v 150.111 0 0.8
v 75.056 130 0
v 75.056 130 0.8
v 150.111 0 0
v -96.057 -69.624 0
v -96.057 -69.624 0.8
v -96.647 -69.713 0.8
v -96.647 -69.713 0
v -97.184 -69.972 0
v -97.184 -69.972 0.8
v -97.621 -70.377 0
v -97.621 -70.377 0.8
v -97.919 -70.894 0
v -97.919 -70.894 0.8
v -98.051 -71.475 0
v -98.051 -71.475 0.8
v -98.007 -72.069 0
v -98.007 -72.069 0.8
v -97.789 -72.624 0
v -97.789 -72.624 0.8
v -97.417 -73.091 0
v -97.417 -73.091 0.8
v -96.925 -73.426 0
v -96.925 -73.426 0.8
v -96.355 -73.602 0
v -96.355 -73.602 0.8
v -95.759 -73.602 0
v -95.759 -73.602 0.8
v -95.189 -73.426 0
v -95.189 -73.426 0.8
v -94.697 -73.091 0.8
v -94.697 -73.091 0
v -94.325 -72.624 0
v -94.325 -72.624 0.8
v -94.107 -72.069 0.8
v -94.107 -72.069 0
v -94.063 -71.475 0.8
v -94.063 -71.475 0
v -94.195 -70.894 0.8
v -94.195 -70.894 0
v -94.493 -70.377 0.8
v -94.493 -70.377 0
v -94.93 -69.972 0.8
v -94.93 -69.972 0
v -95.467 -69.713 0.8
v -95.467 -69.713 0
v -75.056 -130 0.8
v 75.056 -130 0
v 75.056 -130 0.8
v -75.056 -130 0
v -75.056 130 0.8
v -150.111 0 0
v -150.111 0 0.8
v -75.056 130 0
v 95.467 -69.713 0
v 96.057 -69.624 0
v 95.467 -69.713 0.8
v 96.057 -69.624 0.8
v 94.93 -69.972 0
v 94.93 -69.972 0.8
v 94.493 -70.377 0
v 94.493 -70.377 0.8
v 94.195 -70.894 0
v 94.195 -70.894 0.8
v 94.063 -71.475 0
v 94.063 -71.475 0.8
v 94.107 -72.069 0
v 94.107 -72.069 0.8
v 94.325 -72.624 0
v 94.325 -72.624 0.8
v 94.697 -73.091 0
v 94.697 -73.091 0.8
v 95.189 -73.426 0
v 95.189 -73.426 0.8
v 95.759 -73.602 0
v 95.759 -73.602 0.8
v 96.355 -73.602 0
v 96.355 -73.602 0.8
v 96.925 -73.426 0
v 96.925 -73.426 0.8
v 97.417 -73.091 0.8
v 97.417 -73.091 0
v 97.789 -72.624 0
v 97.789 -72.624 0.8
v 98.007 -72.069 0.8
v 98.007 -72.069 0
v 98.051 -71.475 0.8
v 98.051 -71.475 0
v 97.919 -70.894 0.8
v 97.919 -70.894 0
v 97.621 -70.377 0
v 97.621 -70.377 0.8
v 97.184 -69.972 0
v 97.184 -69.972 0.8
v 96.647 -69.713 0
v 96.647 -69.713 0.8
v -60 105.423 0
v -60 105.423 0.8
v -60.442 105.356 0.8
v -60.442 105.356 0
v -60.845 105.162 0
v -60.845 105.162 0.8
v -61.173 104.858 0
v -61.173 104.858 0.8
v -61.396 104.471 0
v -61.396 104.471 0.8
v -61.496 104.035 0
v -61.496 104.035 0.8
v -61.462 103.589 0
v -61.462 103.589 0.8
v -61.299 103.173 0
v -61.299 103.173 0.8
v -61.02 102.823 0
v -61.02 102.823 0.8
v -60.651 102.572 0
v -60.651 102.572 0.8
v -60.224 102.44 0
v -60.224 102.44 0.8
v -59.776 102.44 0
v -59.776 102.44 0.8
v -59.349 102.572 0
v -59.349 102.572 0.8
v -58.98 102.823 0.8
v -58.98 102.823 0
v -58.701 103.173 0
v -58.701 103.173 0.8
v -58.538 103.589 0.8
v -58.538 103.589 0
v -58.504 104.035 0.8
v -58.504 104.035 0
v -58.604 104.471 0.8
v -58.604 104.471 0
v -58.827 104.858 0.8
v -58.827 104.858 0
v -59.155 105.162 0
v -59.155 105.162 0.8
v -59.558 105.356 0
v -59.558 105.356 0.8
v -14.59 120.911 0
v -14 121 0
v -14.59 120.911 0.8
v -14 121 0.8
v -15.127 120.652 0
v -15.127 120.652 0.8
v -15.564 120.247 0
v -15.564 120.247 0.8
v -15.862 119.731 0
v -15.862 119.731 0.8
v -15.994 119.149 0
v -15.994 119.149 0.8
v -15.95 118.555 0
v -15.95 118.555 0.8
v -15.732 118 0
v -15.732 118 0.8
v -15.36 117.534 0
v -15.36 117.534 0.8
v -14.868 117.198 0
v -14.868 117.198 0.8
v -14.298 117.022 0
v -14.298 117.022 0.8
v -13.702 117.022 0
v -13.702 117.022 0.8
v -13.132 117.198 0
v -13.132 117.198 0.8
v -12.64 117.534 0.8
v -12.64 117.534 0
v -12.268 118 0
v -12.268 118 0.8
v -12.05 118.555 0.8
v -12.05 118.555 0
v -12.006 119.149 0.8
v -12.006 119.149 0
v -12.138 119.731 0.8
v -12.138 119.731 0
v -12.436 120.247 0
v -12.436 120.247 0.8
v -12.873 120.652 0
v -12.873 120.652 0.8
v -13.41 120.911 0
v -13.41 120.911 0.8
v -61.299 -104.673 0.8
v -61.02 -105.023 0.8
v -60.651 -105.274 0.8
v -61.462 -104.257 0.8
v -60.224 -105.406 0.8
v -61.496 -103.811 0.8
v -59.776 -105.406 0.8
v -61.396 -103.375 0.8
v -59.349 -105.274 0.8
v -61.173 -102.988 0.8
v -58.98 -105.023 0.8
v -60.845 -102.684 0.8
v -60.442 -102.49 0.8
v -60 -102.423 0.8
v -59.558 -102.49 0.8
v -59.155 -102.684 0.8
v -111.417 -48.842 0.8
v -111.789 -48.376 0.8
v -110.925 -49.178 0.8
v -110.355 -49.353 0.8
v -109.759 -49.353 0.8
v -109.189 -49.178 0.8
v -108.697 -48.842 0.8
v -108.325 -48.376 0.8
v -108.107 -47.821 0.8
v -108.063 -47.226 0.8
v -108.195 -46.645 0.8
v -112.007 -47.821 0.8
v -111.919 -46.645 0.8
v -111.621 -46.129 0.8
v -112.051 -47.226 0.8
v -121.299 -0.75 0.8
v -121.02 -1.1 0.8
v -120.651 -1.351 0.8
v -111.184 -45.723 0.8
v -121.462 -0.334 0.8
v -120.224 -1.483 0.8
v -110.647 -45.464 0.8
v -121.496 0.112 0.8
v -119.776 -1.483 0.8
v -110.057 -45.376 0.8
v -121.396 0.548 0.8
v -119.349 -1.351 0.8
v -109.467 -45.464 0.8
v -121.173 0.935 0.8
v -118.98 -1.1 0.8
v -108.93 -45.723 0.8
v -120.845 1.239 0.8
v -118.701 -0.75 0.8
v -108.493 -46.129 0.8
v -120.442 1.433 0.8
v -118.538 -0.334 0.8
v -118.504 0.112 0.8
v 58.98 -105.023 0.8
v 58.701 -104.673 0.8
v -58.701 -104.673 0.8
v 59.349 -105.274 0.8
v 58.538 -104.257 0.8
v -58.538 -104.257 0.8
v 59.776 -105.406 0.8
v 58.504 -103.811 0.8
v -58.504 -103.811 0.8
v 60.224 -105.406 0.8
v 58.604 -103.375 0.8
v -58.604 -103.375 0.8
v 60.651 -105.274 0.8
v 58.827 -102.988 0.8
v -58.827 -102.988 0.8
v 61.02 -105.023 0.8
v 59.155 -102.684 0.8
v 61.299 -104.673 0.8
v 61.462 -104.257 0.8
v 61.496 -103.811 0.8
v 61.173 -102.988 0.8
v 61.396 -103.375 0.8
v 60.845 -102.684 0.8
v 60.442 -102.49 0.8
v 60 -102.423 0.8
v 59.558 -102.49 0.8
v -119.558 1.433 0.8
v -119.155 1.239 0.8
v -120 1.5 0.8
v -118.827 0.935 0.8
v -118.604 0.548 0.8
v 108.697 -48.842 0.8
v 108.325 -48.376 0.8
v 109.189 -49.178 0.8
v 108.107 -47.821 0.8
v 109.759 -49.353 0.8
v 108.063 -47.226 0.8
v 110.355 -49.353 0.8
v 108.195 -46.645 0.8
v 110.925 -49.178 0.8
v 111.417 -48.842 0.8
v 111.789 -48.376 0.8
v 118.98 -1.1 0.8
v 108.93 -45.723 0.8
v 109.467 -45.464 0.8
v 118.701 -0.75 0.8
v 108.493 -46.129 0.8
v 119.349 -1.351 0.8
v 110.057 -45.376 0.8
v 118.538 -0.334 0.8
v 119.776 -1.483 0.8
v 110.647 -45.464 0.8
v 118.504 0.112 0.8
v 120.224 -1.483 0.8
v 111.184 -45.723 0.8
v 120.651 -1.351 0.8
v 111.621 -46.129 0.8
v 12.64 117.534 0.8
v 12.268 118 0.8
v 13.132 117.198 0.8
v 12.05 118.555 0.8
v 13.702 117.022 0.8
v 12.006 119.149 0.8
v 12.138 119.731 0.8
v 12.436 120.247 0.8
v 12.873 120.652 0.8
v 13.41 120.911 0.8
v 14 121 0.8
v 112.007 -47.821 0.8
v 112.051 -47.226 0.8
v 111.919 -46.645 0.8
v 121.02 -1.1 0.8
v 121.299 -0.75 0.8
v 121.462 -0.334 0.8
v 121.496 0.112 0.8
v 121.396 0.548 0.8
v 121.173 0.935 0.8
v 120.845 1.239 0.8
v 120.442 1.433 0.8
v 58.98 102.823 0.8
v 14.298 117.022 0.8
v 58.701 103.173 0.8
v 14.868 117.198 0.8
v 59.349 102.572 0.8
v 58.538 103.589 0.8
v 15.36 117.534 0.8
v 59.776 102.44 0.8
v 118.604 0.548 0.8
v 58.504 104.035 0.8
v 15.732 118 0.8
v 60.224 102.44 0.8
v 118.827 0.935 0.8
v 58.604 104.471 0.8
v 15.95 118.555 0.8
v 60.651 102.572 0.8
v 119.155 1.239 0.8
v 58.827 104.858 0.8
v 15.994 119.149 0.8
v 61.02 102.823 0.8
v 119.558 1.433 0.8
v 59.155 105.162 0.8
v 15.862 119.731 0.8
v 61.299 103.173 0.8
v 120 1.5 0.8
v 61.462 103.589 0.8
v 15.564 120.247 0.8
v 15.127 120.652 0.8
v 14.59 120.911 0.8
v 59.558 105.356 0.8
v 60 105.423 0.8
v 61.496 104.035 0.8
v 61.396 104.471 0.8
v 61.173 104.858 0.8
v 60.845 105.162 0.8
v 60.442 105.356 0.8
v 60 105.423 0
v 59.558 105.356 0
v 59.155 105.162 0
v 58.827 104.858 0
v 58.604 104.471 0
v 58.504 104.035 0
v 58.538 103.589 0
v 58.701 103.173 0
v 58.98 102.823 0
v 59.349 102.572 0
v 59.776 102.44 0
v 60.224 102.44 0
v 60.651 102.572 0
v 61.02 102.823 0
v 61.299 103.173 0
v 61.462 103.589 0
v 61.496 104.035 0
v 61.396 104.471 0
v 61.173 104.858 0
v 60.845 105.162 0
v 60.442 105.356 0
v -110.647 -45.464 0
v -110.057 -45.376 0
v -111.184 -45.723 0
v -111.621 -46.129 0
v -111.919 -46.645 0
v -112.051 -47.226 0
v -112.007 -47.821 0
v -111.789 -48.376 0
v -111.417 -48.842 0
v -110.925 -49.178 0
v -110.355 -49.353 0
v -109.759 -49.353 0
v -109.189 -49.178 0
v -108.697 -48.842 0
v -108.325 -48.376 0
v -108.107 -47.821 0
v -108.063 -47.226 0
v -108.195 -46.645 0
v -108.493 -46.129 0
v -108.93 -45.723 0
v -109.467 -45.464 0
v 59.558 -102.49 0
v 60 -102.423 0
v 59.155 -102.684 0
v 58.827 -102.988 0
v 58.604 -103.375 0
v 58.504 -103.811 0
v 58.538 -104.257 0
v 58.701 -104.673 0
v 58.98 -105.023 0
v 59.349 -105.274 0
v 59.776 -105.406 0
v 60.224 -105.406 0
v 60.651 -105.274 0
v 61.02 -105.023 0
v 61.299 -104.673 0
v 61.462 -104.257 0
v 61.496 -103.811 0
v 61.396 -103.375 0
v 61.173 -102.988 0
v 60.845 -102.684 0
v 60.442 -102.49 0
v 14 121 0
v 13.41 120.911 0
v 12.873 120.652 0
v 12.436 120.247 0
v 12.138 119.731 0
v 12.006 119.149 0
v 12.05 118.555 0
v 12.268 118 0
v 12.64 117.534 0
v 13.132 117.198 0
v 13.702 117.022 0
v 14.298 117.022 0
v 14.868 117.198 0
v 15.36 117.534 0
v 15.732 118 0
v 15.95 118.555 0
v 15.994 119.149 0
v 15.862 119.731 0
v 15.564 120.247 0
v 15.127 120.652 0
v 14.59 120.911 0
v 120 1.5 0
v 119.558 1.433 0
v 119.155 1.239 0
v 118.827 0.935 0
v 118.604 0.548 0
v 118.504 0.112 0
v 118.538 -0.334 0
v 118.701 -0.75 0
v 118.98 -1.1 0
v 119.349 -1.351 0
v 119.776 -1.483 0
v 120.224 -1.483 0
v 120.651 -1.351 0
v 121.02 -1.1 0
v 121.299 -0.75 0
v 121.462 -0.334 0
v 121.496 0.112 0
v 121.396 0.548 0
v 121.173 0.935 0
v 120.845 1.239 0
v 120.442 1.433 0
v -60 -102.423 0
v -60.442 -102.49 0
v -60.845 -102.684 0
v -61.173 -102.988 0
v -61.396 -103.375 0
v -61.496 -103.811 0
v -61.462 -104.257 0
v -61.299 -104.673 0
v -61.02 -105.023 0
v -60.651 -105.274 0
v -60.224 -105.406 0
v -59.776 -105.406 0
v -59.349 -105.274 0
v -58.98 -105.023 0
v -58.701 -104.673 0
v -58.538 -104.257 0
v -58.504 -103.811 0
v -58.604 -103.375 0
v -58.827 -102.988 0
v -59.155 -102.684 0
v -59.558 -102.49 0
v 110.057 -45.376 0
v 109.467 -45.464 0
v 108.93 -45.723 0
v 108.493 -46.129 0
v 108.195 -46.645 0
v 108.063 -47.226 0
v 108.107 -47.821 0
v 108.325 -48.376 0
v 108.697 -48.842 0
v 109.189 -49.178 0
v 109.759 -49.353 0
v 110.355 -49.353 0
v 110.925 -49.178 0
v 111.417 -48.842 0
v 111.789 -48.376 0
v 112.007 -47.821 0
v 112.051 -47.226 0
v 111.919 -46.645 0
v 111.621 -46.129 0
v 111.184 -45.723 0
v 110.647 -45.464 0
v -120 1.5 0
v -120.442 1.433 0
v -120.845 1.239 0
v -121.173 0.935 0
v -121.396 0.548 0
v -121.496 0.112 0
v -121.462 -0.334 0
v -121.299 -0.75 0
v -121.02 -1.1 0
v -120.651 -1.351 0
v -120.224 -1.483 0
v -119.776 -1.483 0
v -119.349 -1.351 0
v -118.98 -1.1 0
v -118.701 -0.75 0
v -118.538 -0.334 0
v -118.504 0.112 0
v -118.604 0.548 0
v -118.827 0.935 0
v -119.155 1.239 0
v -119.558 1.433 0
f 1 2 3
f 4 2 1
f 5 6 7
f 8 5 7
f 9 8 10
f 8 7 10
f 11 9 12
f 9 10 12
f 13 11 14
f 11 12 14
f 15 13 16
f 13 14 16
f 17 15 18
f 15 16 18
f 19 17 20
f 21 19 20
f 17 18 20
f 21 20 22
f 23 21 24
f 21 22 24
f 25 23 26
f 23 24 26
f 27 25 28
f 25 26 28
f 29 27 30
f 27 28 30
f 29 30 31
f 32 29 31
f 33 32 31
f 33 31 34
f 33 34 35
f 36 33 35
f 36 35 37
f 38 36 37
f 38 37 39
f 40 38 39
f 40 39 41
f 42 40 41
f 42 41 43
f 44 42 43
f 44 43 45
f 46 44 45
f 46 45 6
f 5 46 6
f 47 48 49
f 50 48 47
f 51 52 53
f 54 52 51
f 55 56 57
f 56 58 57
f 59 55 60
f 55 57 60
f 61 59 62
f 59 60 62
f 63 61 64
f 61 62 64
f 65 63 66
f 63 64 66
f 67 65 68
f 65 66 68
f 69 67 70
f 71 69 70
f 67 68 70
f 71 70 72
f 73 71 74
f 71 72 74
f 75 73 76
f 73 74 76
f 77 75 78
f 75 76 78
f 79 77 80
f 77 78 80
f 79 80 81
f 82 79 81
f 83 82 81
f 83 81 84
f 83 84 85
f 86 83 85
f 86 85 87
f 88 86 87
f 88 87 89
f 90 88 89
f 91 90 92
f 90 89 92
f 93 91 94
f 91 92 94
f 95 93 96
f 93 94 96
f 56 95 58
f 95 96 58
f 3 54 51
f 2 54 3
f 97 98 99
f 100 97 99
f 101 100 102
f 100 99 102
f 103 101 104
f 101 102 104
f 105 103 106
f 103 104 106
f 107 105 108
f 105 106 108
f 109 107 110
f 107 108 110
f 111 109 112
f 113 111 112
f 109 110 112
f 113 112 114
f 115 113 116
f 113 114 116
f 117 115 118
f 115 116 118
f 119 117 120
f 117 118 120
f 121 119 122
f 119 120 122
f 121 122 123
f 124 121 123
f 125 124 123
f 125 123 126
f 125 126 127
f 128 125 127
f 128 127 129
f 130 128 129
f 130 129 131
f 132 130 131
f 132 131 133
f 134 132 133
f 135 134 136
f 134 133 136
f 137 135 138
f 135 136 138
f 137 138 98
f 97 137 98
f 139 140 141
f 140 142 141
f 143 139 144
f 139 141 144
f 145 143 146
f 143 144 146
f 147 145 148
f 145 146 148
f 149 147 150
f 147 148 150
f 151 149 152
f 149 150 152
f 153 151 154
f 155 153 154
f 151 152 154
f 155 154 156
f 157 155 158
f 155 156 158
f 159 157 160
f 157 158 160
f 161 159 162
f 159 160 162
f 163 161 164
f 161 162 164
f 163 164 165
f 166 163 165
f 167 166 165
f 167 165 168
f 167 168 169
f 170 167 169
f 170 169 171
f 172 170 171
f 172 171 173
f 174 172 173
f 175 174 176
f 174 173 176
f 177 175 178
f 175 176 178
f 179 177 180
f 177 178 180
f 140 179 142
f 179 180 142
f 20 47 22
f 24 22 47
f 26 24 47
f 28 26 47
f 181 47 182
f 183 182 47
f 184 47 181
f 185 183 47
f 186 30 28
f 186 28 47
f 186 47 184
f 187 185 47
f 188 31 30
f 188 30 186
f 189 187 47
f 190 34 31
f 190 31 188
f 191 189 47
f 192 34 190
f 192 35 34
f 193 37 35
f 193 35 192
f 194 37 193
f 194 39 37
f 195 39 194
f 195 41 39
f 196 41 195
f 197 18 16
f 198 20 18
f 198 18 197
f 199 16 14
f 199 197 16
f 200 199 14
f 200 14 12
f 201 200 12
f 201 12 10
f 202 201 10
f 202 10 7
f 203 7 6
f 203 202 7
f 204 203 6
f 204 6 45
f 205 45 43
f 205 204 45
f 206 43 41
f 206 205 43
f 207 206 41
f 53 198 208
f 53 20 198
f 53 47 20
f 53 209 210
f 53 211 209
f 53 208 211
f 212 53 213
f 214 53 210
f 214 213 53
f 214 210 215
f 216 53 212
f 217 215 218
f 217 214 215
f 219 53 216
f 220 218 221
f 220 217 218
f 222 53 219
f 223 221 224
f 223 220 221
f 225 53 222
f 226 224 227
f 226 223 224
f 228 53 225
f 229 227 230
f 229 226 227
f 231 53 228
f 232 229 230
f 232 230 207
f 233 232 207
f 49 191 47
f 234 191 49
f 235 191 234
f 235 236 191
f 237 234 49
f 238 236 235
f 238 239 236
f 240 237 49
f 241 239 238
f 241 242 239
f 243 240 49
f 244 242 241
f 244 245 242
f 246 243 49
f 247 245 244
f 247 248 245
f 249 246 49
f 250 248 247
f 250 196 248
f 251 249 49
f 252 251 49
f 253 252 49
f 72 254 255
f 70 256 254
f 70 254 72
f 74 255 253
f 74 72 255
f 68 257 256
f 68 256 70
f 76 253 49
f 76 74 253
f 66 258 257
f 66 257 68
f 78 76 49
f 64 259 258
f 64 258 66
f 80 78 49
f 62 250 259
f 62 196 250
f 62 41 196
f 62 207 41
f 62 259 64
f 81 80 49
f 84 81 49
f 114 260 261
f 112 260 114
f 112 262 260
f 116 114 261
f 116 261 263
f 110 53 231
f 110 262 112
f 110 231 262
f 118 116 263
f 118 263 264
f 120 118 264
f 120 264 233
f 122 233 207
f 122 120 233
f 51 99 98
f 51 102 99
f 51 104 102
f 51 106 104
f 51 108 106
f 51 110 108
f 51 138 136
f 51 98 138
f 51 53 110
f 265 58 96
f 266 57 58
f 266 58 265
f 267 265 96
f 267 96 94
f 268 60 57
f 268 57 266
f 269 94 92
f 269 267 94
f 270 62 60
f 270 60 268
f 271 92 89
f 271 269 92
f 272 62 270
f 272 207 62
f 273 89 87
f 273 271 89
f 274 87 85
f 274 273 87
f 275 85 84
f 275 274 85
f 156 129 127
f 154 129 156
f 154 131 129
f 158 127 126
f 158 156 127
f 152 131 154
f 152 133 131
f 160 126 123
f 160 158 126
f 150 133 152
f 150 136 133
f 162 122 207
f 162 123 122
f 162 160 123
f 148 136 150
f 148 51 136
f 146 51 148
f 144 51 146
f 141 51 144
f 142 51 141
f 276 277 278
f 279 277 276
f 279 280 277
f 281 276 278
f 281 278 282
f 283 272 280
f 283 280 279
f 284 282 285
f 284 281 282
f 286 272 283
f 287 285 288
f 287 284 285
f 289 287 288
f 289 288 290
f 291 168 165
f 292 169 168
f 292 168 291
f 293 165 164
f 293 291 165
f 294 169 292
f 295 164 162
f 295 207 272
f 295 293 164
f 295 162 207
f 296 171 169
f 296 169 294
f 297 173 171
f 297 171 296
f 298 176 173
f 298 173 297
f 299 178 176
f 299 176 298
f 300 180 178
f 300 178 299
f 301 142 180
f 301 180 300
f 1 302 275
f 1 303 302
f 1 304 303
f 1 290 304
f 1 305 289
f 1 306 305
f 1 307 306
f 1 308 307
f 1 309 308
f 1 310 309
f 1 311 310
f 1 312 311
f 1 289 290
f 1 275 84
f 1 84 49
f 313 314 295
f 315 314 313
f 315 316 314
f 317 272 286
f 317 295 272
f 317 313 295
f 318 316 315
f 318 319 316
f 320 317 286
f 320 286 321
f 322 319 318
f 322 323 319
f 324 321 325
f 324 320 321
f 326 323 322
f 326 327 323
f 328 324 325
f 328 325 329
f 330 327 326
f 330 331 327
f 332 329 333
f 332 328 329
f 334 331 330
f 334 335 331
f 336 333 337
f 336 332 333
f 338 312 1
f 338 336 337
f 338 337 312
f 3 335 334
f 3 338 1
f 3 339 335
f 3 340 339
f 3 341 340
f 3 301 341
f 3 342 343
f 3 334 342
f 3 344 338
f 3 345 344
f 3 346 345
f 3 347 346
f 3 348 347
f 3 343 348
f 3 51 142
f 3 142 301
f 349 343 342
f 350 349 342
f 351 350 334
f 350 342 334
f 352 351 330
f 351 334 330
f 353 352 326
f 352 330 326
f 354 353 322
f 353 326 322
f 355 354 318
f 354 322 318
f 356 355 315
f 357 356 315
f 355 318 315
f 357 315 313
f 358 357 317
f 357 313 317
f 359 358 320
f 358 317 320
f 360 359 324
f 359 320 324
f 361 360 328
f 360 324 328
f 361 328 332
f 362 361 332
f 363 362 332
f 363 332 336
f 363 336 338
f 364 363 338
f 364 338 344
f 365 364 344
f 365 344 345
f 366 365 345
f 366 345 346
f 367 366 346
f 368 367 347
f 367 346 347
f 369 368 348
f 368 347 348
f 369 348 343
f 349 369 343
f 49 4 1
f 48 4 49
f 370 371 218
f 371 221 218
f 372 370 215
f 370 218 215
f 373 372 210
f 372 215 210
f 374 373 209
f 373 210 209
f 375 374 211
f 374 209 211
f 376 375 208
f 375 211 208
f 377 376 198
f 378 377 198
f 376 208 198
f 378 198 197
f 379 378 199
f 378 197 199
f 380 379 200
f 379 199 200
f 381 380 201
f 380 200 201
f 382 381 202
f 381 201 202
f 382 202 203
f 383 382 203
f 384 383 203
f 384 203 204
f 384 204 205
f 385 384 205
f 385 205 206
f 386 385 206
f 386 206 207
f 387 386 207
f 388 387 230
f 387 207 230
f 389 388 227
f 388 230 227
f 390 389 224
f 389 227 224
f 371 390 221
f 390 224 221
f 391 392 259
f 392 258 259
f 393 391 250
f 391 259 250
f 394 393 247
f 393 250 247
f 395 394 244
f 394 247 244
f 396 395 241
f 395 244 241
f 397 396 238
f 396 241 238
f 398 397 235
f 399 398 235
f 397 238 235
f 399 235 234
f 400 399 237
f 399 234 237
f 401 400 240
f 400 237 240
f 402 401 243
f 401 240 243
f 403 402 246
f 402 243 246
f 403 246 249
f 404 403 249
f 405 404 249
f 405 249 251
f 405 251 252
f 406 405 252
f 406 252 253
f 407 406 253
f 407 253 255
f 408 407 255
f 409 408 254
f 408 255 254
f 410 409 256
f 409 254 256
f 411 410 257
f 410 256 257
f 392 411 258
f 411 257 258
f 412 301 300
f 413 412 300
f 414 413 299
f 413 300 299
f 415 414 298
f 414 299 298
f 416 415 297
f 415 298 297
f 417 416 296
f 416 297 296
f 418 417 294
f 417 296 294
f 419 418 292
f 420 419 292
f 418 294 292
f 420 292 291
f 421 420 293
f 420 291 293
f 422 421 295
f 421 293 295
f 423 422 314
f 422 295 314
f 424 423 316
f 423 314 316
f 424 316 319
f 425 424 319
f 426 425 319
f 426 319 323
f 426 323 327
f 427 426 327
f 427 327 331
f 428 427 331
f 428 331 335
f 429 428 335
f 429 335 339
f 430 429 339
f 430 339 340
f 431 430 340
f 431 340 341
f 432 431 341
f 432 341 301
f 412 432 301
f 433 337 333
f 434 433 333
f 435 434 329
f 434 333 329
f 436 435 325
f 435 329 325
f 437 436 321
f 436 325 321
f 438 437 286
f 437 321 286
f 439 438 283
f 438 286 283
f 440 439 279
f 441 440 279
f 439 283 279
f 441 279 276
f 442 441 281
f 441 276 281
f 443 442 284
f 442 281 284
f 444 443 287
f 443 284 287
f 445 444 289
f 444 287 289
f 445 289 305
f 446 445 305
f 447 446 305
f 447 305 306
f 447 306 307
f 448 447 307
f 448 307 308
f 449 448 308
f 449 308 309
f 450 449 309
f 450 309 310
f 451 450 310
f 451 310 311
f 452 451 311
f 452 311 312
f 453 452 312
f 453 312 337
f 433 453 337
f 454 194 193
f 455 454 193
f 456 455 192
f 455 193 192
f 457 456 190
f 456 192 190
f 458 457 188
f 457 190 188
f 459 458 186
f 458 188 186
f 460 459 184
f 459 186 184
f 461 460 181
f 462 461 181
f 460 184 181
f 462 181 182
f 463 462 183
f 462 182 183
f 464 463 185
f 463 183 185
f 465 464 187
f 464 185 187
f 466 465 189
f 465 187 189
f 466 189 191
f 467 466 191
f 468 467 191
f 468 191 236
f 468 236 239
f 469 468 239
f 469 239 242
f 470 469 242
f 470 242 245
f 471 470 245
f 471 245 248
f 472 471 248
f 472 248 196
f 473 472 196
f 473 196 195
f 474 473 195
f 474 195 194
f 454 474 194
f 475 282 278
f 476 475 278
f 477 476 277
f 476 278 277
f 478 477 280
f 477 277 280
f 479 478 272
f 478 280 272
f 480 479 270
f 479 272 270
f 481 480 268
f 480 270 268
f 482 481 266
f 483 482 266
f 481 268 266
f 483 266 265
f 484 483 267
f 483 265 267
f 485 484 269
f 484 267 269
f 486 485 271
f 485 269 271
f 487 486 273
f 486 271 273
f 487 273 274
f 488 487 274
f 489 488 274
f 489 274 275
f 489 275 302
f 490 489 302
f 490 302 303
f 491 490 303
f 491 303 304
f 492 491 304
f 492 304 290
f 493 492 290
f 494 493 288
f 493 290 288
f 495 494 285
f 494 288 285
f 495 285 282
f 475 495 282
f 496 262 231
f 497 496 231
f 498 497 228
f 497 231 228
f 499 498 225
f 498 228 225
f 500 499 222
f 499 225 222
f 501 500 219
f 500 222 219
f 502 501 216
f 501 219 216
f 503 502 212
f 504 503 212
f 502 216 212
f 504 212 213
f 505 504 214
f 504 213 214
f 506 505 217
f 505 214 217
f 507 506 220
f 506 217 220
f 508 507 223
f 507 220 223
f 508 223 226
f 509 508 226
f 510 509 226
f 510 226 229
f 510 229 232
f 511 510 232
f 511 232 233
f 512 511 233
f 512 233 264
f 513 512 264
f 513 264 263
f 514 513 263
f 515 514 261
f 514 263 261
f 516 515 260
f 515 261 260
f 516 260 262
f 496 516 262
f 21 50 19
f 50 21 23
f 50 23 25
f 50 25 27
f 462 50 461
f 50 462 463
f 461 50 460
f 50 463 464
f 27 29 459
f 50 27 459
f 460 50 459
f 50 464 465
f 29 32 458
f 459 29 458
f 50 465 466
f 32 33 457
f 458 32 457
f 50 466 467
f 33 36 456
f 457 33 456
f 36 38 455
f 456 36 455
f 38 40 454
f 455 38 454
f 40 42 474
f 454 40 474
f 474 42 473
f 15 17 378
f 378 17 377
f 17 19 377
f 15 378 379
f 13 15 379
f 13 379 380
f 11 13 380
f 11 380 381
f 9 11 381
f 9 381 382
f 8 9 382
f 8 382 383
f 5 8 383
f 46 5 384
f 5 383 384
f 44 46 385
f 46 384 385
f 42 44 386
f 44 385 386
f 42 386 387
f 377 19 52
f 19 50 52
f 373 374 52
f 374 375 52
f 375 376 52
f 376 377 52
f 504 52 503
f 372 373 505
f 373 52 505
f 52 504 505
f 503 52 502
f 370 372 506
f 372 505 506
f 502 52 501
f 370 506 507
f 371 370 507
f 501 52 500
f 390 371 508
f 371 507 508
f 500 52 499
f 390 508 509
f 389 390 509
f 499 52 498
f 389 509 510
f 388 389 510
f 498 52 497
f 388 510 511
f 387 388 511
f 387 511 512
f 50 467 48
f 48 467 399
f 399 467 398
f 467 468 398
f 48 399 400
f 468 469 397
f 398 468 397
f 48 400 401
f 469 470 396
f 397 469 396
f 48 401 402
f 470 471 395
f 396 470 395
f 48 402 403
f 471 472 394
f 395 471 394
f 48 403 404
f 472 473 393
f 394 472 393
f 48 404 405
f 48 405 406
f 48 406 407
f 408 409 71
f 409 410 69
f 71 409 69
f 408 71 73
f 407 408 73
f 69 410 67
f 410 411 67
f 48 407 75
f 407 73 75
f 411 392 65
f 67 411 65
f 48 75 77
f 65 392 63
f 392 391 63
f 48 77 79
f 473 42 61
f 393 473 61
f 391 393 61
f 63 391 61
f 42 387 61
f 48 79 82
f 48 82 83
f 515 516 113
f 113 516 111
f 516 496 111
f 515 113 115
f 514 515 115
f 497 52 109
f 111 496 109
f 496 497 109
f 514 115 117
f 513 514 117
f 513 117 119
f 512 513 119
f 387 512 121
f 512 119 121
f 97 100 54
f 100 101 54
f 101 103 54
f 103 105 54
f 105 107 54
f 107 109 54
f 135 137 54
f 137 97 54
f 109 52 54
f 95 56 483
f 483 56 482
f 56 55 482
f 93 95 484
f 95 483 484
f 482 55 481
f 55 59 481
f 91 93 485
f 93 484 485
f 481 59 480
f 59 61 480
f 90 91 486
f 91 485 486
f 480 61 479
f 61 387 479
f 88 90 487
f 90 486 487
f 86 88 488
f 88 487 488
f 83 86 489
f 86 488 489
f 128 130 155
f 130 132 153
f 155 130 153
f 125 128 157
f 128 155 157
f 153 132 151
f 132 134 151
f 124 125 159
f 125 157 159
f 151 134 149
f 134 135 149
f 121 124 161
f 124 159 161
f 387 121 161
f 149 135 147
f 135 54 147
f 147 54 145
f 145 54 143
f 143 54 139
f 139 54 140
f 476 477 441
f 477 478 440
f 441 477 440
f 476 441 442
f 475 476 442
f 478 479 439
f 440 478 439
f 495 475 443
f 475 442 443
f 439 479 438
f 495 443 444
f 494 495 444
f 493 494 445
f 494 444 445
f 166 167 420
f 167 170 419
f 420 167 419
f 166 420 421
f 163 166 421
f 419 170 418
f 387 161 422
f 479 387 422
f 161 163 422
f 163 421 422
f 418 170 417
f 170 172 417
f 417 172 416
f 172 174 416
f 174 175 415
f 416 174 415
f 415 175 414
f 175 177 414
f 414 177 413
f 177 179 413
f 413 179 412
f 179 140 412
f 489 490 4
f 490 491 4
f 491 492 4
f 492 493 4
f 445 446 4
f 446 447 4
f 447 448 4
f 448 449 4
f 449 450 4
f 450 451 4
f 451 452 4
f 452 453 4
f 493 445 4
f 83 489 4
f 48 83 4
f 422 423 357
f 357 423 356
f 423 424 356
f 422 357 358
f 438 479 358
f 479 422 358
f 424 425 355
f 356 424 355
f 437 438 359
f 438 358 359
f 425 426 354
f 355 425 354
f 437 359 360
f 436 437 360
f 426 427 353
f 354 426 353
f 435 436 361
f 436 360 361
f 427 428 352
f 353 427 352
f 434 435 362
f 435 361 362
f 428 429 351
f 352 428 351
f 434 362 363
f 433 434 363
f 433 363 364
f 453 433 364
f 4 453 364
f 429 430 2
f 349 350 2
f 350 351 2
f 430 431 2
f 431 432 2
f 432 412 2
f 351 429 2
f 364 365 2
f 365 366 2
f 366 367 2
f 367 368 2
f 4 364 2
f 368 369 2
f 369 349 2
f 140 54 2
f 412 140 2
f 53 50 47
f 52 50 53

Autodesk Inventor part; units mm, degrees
ref_plane "YZ Plane" through (0, 0, 0) normal (1, 0, 0) x (0, 1, 0)
ref_plane "XZ Plane" through (0, 0, 0) normal (0, 1, 0) x (-1, 0, 0)
ref_plane "XY Plane" through (0, 0, 0) normal (0, 0, 1) x (1, 0, 0)
sketch "Szkic1" plane through (0, 0, 0) normal (0, 0, 1) x (1, 0, 0)
  line L0 (75.0555, 130) -> (150.1111, 0)
  line L1 (150.1111, 0) -> (75.0555, -130)
  line L2 (75.0555, -130) -> (-75.0555, -130)
  line L3 (-75.0555, -130) -> (-150.1111, 0)
  line L4 (-150.1111, 0) -> (-75.0555, 130)
  line L5 (-75.0555, 130) -> (75.0555, 130)
  point P0 (0, 0)
  point P1 (0, 0)
  dimension "d0" = 130
extrude "Płyta1" add sketch "Szkic1" along normal blind 0.8
ref_plane "Płaszczyzna konstrukcyjna2" through (112.5833, 65, 0.8) normal (-0.5, 0.8660254, 0) x (0, 0, -1)
ref_plane "Płaszczyzna konstrukcyjna3" through (-112.5833, 65, 0) normal (0.5, 0.8660254, 0) x (0, 0, 1)
sketch "Szkic22" plane through (0, 0, 0) normal (0, 0, -1) x (-1, 0, 0)
  circle A0 centre (-120, 0) radius 1.5 projected
  point P0 (0, 0)
  point P1 (-60, -103.923)
  point P2 (60, -103.923)
  point P3 (120, 0)
  point P4 (60, 103.923)
  point P5 (-60, 103.923)
  dimension "d132" = 360
hole "Otwór7" at (120, 0, 0) at (60, -103.923, 0) at (-60, -103.923, 0) at (-120, 0, 0) at (-60, 103.923, 0) at (60, 103.923, 0) direction (0, 0, 1) diameter 3 depth 0.8 tip angle 118
sketch "Szkic23" plane through (0, 0, 0) normal (0, 0, -1) x (-1, 0, 0)
  circle A0 centre (-96.057, -71.6244) radius 2 projected
  circle A1 centre (-110.057, -47.3756) radius 2 projected
  line L0 (-106.6109, -41.3446) -> (-89.1109, -71.6554) projected
  line L1 (-89.1109, -71.6554) -> (-99.5032, -77.6554) projected
  line L2 (-117.0032, -47.3446) -> (-99.5032, -77.6554) projected
  line L3 (-106.6109, -41.3446) -> (-117.0032, -47.3446) projected
  circle A2 centre (110.057, -47.3756) radius 2 projected
  circle A3 centre (96.057, -71.6244) radius 2 projected
  line L4 (89.1109, -71.6554) -> (106.6109, -41.3446) projected
  line L5 (106.6109, -41.3446) -> (117.0032, -47.3446) projected
  line L6 (99.5032, -77.6554) -> (117.0032, -47.3446) projected
  line L7 (89.1109, -71.6554) -> (99.5032, -77.6554) projected
  circle A4 centre (-14, 119) radius 2 projected
  circle A5 centre (14, 119) radius 2 projected
  line L8 (17.5, 113) -> (-17.5, 113) projected
  line L9 (-17.5, 113) -> (-17.5, 125) projected
  line L10 (17.5, 125) -> (-17.5, 125) projected
  line L11 (17.5, 113) -> (17.5, 125) projected
  point P0 (0, 0)
hole "Otwór8" at (-96.057, -71.6244, 0) at (-110.057, -47.3756, 0) at (-14, 119, 0) at (14, 119, 0) at (110.057, -47.3756, 0) at (96.057, -71.6244, 0) direction (0, 0, 1) diameter 4 depth 0.8 tip angle 118
equation "\"d139\" = Grubość"
equation "\"d146\" = Grubość"
equation "\"PromieńGięcia\" = Grubość"
equation "\"SzerokośćGięciaPodcięcia\" = Grubość"
equation "\"GłębokośćGięciaPodcięcia\" = 0.5 * Grubość"
equation "\"RozmiarPodcięciaNarożnika\" = 4 * Grubość"
equation "\"MinimalnaPozostałość\" = 2 * Grubość"
equation "\"PromieńPrzejścia\" = PromieńGięcia"
equation "\"Rozmiar_promienia_Jacobiego\" = Grubość"
equation "\"Wielk_odstępu\" = Grubość"
equation "\"d1\" = PromieńGięcia"
equation "\"Grubość\" = 0.8"
properties part number "base_bottom"
